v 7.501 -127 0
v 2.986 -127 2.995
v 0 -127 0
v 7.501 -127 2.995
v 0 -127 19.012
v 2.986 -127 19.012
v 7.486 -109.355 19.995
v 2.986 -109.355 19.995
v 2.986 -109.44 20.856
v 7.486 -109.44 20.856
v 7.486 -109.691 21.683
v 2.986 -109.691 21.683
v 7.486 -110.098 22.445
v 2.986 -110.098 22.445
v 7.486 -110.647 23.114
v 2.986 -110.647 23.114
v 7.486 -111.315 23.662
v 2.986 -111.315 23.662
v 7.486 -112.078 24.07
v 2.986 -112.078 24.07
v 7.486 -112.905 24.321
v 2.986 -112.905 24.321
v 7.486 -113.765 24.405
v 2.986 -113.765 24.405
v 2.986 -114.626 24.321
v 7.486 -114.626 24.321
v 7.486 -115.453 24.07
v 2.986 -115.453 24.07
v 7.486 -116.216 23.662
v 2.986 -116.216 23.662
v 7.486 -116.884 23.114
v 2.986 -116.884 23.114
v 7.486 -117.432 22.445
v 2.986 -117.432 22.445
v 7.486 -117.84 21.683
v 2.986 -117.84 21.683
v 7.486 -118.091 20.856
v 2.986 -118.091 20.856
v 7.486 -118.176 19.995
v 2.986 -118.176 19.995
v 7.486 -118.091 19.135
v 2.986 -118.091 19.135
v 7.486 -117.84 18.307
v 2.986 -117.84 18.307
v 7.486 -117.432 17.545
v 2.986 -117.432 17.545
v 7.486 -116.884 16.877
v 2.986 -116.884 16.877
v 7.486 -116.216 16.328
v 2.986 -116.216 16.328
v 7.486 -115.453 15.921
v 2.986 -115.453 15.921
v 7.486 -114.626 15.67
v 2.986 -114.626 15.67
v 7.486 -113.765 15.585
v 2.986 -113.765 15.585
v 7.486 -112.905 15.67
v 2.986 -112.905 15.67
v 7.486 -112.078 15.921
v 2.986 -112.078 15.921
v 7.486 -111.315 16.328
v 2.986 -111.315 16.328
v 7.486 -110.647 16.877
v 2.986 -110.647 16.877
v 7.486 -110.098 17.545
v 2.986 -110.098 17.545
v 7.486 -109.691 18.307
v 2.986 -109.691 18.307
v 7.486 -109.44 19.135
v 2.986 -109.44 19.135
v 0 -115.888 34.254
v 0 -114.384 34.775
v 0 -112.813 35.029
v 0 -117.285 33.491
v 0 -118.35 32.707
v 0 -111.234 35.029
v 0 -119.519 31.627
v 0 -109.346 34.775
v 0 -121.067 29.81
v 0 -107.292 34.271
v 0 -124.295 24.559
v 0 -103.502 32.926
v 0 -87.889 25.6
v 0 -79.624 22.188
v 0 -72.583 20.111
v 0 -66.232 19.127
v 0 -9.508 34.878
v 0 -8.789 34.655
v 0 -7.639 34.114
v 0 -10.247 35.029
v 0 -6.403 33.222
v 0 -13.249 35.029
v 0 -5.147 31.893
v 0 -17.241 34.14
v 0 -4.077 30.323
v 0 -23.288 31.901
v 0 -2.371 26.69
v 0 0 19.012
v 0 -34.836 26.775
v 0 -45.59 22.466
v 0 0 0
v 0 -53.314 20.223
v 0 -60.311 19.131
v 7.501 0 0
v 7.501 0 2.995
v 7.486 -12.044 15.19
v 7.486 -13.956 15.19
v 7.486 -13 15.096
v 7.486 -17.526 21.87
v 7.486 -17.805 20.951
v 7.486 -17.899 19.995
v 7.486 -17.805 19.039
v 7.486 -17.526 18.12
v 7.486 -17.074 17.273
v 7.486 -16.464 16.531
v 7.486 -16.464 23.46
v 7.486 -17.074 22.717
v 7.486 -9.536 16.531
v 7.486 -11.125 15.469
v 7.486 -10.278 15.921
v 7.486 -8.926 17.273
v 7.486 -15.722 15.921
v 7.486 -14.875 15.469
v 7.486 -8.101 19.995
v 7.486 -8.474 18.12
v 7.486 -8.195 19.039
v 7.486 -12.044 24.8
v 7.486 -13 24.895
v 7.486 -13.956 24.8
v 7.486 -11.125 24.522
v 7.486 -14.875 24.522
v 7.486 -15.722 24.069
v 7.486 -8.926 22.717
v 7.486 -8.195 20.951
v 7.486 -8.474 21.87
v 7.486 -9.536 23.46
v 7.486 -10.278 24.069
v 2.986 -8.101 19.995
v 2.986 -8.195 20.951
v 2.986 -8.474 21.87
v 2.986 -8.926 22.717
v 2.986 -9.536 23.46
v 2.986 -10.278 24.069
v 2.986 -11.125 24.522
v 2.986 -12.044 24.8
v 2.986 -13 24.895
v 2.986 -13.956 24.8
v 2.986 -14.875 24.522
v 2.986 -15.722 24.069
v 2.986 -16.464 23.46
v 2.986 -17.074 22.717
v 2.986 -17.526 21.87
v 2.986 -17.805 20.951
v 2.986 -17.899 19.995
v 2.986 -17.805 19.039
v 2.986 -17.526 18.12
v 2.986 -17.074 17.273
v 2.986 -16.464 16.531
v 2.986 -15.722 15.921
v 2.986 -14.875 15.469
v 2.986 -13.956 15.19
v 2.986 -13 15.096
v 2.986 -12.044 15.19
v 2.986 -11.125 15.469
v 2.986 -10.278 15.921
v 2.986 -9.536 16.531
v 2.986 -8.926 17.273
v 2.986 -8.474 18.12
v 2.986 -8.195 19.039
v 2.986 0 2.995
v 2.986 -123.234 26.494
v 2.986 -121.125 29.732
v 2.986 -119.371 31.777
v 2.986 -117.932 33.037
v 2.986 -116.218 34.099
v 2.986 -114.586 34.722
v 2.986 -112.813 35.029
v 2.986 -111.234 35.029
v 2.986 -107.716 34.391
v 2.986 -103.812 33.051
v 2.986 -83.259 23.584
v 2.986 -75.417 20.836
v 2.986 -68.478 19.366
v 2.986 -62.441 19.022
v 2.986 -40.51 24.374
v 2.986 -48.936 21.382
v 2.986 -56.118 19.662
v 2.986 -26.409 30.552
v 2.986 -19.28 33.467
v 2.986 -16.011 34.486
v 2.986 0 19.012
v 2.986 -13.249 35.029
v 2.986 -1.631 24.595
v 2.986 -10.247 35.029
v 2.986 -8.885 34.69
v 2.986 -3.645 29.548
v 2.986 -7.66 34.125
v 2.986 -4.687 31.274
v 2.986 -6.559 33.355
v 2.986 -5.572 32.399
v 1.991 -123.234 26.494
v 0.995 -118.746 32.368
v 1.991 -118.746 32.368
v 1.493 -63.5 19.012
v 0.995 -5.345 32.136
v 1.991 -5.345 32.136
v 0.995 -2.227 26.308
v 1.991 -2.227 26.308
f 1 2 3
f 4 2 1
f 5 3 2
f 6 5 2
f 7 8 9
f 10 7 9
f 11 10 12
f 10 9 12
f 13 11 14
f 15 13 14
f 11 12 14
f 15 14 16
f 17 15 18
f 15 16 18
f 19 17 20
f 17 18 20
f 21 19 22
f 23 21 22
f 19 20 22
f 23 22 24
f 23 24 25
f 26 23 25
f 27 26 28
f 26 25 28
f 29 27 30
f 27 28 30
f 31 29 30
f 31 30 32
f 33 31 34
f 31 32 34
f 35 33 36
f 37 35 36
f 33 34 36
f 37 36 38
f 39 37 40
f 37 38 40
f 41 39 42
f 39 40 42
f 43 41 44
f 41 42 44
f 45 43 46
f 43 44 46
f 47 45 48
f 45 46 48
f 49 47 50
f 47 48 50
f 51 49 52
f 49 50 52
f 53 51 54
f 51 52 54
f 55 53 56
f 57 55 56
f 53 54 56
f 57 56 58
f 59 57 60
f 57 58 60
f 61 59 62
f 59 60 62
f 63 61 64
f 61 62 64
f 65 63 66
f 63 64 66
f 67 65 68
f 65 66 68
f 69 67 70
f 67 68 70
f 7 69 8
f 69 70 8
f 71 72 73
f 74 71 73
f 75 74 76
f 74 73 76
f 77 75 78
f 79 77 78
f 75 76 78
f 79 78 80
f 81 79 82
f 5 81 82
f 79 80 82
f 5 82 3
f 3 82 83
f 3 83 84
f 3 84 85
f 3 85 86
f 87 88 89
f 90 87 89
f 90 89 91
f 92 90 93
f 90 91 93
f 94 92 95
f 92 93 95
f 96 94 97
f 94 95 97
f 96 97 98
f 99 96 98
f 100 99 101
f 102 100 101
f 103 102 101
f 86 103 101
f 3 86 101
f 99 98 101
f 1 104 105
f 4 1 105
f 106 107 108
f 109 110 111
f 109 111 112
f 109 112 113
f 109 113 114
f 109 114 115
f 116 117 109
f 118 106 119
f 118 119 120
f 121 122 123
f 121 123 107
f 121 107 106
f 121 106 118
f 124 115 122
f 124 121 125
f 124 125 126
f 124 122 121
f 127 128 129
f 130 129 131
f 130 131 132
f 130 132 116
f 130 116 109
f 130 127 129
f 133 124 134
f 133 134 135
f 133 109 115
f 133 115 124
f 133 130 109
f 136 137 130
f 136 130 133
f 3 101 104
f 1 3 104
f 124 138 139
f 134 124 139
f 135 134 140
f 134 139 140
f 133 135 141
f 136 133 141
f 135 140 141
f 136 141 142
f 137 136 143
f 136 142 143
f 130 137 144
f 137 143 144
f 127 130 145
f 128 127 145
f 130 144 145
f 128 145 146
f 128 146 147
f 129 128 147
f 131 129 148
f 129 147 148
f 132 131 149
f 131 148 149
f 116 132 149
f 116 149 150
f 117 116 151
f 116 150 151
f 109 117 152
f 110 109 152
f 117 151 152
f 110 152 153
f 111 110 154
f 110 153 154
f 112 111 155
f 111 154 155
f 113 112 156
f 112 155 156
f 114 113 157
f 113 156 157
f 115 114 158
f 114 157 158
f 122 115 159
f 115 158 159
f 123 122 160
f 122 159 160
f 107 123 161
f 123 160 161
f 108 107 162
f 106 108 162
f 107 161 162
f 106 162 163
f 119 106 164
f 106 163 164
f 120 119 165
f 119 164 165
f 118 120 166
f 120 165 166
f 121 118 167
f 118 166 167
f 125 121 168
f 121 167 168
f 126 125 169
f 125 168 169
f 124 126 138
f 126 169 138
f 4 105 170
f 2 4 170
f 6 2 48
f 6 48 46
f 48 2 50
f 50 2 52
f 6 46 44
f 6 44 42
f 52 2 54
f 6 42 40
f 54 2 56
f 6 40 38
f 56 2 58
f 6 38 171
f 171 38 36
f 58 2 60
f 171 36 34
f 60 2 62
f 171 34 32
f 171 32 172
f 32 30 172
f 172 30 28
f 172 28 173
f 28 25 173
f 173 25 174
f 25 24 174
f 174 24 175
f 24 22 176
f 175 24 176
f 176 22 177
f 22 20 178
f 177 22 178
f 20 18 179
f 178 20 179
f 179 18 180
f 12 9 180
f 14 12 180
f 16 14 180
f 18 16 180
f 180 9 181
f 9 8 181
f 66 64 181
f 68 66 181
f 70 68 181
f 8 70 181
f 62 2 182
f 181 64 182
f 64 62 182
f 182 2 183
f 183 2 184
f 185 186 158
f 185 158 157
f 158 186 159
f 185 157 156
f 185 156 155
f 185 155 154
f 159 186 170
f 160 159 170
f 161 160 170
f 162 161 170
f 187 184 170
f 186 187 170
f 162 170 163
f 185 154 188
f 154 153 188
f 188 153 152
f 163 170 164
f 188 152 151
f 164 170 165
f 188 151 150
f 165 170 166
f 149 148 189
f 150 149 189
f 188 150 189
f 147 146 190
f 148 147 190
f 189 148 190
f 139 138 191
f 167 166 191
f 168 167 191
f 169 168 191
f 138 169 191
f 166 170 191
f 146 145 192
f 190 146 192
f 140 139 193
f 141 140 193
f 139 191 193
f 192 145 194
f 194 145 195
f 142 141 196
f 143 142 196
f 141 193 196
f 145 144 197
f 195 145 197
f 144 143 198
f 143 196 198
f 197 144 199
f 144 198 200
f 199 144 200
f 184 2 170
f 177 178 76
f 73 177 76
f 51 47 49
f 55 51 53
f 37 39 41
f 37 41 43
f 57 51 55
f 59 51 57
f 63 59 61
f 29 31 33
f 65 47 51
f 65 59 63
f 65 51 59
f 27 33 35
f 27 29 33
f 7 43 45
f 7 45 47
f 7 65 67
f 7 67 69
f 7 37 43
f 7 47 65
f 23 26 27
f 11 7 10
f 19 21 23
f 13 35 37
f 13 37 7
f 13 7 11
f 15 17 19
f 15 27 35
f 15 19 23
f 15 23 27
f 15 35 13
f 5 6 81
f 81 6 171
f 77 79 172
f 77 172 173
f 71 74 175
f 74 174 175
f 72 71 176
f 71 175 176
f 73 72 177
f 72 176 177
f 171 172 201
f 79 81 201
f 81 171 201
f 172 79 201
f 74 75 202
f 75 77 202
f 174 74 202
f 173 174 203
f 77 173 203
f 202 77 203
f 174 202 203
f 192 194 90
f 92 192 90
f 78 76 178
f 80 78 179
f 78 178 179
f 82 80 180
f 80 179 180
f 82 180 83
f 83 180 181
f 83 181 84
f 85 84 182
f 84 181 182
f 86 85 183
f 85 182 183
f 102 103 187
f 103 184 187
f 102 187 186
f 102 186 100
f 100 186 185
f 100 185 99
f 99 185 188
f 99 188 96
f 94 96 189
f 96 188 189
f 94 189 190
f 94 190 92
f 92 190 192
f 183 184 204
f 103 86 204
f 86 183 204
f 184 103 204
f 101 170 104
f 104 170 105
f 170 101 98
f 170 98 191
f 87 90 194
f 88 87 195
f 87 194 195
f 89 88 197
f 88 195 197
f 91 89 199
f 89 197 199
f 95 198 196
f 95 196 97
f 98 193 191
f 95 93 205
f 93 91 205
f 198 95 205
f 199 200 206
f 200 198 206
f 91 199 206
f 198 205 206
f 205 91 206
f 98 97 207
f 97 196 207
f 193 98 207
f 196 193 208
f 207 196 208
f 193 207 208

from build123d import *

# Parameters (mm, degrees)
F1_DEPTH = 127
F2_R     = 4.4102581717
F2_R_2   = 4.8994098274
F3_DEPTH = 4.5
F5_DEPTH = 25


with BuildPart() as f1:
    # F0 (on Front) → F1 (new body)
    with BuildSketch(Plane.XZ):
        Polygon((0, 35.0287221372), (0, 0), (7.501238957, 0), (7.501238957, 2.9951336328), (2.985865809, 2.9951336328), (2.985865809, 35.0287221372), align=None)
    extrude(amount=F1_DEPTH)

    # F2 (on face) → F3 (join)
    with BuildSketch(Plane.YZ.offset(2.985865809)):
        with Locations((-113.7654781342, 19.9951336328)):
            Circle(F2_R)
        with Locations((-13, 19.9951336328)):
            Circle(F2_R_2)
    extrude(amount=F3_DEPTH)

    # F4 (on face) → F5 (cut)
    with BuildSketch(Plane.YZ.offset(2.985865809)):
        with BuildLine():
            Line((-13.2493425337, 35.0287221372), (-111.2344633553, 35.0287221372))
            add(Edge.make_bspline(
                [(-111.2344633553, 35.0287221372), (-100.3129034646, 34.2859826119), (-64.8860498538, 4.0545608595), (-24.5372166276, 33.6567649219), (-13.2493425337, 35.0287221372)],
                knots=[0.2100734241, 0.2100734241, 0.2100734241, 0.2100734241, 0.5001806892, 0.7879158408, 0.7879158408, 0.7879158408, 0.7879158408], degree=3))
        make_face()
        with BuildLine():
            Line((-127, 35.0287221372), (-127, 19.011927885))
            add(Edge.make_bspline(
                [(-127, 19.011927885), (-123.3541108211, 26.7616729413), (-119.7082216422, 34.5114179975), (-112.8133311868, 35.0287221372)],
                knots=[0, 0, 0, 0, 0.1956359691, 0.1956359691, 0.1956359691, 0.1956359691], degree=3))
            Line((-112.8133311868, 35.0287221372), (-127, 35.0287221372))
        make_face()
        with BuildLine():
            add(Edge.make_bspline(
                [(-10.2470470592, 35.0287221372), (-4.1562861309, 34.0936794049), (-2.0781430654, 26.552803645), (0, 19.011927885)],
                knots=[0.8155753696, 0.8155753696, 0.8155753696, 0.8155753696, 1, 1, 1, 1], degree=3))
            Line((0, 19.011927885), (0, 35.0287221372))
            Line((0, 35.0287221372), (-10.2470470592, 35.0287221372))
        make_face()
    extrude(amount=-F5_DEPTH, mode=Mode.SUBTRACT)


solid = f1.part
